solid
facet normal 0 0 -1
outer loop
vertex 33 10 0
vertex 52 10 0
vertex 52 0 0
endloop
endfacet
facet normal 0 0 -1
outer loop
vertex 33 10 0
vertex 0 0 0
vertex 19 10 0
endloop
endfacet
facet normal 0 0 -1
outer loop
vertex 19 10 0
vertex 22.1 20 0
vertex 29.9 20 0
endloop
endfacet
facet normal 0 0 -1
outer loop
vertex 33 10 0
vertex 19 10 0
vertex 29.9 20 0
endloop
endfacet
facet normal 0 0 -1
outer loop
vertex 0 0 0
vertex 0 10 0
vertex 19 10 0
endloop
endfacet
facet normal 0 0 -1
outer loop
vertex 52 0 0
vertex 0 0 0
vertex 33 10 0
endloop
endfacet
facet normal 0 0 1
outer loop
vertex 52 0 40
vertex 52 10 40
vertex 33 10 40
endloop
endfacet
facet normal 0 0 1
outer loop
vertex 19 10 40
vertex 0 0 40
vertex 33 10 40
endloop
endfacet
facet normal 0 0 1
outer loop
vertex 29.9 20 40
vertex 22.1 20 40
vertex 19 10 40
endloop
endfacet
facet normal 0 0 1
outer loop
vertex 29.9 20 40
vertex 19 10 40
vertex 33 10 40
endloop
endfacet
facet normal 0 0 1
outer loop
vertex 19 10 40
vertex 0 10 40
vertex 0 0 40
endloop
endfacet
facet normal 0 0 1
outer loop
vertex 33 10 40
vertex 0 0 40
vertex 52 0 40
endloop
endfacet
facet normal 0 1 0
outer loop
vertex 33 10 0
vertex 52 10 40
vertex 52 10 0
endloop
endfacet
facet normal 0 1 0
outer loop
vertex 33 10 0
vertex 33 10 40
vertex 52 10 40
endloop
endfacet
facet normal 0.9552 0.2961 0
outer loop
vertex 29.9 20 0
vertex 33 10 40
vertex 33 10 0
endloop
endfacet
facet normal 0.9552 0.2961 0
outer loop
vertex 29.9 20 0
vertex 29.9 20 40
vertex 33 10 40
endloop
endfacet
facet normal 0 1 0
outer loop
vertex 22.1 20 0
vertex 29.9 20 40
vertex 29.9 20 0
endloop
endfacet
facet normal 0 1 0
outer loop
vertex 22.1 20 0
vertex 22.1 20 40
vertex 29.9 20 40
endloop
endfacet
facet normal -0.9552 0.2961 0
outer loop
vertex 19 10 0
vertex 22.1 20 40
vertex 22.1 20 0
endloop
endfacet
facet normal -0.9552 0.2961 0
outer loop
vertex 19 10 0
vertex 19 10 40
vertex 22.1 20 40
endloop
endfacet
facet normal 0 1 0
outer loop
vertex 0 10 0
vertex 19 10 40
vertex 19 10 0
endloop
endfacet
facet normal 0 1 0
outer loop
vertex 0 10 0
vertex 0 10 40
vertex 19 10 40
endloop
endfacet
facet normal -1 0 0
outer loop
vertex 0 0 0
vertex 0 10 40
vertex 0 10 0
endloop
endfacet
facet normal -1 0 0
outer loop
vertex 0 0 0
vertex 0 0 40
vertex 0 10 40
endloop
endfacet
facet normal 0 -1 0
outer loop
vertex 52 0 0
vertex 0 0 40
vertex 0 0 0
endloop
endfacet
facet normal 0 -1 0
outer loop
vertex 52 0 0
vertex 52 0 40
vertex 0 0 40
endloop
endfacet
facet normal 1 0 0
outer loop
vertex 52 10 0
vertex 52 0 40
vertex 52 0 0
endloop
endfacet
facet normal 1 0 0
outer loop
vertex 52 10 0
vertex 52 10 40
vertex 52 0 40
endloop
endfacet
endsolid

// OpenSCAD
$fn = 32;

// ----------------------------------------------------------------------
// V guide rail: dovetail, 52 mm wide
// ----------------------------------------------------------------------

// --- parameters (mm) ---
rail_w = 52;              // rail width, X
base_t = 10;              // base plate thickness
v_depth = 10;             // V feature depth / height
v_half_w = 7;             // half width of the V at the base face
plate_t = 40;             // rail length, Z (the extrusion height)
top_half_w = 3.9;         // half width at the dovetail top

dovetail_base = 2 * v_half_w;  // dovetail width at the base
dovetail_top = 2 * top_half_w;  // dovetail width at the top

profile = [[0, 0], [52, 0], [52, 10], [33, 10], [29.9, 20], [22.1, 20], [19, 10], [0, 10]];  // primary outline, 8 points, counter clockwise

// --- the one profile operation ---
linear_extrude(height = plate_t) polygon(points = profile);
